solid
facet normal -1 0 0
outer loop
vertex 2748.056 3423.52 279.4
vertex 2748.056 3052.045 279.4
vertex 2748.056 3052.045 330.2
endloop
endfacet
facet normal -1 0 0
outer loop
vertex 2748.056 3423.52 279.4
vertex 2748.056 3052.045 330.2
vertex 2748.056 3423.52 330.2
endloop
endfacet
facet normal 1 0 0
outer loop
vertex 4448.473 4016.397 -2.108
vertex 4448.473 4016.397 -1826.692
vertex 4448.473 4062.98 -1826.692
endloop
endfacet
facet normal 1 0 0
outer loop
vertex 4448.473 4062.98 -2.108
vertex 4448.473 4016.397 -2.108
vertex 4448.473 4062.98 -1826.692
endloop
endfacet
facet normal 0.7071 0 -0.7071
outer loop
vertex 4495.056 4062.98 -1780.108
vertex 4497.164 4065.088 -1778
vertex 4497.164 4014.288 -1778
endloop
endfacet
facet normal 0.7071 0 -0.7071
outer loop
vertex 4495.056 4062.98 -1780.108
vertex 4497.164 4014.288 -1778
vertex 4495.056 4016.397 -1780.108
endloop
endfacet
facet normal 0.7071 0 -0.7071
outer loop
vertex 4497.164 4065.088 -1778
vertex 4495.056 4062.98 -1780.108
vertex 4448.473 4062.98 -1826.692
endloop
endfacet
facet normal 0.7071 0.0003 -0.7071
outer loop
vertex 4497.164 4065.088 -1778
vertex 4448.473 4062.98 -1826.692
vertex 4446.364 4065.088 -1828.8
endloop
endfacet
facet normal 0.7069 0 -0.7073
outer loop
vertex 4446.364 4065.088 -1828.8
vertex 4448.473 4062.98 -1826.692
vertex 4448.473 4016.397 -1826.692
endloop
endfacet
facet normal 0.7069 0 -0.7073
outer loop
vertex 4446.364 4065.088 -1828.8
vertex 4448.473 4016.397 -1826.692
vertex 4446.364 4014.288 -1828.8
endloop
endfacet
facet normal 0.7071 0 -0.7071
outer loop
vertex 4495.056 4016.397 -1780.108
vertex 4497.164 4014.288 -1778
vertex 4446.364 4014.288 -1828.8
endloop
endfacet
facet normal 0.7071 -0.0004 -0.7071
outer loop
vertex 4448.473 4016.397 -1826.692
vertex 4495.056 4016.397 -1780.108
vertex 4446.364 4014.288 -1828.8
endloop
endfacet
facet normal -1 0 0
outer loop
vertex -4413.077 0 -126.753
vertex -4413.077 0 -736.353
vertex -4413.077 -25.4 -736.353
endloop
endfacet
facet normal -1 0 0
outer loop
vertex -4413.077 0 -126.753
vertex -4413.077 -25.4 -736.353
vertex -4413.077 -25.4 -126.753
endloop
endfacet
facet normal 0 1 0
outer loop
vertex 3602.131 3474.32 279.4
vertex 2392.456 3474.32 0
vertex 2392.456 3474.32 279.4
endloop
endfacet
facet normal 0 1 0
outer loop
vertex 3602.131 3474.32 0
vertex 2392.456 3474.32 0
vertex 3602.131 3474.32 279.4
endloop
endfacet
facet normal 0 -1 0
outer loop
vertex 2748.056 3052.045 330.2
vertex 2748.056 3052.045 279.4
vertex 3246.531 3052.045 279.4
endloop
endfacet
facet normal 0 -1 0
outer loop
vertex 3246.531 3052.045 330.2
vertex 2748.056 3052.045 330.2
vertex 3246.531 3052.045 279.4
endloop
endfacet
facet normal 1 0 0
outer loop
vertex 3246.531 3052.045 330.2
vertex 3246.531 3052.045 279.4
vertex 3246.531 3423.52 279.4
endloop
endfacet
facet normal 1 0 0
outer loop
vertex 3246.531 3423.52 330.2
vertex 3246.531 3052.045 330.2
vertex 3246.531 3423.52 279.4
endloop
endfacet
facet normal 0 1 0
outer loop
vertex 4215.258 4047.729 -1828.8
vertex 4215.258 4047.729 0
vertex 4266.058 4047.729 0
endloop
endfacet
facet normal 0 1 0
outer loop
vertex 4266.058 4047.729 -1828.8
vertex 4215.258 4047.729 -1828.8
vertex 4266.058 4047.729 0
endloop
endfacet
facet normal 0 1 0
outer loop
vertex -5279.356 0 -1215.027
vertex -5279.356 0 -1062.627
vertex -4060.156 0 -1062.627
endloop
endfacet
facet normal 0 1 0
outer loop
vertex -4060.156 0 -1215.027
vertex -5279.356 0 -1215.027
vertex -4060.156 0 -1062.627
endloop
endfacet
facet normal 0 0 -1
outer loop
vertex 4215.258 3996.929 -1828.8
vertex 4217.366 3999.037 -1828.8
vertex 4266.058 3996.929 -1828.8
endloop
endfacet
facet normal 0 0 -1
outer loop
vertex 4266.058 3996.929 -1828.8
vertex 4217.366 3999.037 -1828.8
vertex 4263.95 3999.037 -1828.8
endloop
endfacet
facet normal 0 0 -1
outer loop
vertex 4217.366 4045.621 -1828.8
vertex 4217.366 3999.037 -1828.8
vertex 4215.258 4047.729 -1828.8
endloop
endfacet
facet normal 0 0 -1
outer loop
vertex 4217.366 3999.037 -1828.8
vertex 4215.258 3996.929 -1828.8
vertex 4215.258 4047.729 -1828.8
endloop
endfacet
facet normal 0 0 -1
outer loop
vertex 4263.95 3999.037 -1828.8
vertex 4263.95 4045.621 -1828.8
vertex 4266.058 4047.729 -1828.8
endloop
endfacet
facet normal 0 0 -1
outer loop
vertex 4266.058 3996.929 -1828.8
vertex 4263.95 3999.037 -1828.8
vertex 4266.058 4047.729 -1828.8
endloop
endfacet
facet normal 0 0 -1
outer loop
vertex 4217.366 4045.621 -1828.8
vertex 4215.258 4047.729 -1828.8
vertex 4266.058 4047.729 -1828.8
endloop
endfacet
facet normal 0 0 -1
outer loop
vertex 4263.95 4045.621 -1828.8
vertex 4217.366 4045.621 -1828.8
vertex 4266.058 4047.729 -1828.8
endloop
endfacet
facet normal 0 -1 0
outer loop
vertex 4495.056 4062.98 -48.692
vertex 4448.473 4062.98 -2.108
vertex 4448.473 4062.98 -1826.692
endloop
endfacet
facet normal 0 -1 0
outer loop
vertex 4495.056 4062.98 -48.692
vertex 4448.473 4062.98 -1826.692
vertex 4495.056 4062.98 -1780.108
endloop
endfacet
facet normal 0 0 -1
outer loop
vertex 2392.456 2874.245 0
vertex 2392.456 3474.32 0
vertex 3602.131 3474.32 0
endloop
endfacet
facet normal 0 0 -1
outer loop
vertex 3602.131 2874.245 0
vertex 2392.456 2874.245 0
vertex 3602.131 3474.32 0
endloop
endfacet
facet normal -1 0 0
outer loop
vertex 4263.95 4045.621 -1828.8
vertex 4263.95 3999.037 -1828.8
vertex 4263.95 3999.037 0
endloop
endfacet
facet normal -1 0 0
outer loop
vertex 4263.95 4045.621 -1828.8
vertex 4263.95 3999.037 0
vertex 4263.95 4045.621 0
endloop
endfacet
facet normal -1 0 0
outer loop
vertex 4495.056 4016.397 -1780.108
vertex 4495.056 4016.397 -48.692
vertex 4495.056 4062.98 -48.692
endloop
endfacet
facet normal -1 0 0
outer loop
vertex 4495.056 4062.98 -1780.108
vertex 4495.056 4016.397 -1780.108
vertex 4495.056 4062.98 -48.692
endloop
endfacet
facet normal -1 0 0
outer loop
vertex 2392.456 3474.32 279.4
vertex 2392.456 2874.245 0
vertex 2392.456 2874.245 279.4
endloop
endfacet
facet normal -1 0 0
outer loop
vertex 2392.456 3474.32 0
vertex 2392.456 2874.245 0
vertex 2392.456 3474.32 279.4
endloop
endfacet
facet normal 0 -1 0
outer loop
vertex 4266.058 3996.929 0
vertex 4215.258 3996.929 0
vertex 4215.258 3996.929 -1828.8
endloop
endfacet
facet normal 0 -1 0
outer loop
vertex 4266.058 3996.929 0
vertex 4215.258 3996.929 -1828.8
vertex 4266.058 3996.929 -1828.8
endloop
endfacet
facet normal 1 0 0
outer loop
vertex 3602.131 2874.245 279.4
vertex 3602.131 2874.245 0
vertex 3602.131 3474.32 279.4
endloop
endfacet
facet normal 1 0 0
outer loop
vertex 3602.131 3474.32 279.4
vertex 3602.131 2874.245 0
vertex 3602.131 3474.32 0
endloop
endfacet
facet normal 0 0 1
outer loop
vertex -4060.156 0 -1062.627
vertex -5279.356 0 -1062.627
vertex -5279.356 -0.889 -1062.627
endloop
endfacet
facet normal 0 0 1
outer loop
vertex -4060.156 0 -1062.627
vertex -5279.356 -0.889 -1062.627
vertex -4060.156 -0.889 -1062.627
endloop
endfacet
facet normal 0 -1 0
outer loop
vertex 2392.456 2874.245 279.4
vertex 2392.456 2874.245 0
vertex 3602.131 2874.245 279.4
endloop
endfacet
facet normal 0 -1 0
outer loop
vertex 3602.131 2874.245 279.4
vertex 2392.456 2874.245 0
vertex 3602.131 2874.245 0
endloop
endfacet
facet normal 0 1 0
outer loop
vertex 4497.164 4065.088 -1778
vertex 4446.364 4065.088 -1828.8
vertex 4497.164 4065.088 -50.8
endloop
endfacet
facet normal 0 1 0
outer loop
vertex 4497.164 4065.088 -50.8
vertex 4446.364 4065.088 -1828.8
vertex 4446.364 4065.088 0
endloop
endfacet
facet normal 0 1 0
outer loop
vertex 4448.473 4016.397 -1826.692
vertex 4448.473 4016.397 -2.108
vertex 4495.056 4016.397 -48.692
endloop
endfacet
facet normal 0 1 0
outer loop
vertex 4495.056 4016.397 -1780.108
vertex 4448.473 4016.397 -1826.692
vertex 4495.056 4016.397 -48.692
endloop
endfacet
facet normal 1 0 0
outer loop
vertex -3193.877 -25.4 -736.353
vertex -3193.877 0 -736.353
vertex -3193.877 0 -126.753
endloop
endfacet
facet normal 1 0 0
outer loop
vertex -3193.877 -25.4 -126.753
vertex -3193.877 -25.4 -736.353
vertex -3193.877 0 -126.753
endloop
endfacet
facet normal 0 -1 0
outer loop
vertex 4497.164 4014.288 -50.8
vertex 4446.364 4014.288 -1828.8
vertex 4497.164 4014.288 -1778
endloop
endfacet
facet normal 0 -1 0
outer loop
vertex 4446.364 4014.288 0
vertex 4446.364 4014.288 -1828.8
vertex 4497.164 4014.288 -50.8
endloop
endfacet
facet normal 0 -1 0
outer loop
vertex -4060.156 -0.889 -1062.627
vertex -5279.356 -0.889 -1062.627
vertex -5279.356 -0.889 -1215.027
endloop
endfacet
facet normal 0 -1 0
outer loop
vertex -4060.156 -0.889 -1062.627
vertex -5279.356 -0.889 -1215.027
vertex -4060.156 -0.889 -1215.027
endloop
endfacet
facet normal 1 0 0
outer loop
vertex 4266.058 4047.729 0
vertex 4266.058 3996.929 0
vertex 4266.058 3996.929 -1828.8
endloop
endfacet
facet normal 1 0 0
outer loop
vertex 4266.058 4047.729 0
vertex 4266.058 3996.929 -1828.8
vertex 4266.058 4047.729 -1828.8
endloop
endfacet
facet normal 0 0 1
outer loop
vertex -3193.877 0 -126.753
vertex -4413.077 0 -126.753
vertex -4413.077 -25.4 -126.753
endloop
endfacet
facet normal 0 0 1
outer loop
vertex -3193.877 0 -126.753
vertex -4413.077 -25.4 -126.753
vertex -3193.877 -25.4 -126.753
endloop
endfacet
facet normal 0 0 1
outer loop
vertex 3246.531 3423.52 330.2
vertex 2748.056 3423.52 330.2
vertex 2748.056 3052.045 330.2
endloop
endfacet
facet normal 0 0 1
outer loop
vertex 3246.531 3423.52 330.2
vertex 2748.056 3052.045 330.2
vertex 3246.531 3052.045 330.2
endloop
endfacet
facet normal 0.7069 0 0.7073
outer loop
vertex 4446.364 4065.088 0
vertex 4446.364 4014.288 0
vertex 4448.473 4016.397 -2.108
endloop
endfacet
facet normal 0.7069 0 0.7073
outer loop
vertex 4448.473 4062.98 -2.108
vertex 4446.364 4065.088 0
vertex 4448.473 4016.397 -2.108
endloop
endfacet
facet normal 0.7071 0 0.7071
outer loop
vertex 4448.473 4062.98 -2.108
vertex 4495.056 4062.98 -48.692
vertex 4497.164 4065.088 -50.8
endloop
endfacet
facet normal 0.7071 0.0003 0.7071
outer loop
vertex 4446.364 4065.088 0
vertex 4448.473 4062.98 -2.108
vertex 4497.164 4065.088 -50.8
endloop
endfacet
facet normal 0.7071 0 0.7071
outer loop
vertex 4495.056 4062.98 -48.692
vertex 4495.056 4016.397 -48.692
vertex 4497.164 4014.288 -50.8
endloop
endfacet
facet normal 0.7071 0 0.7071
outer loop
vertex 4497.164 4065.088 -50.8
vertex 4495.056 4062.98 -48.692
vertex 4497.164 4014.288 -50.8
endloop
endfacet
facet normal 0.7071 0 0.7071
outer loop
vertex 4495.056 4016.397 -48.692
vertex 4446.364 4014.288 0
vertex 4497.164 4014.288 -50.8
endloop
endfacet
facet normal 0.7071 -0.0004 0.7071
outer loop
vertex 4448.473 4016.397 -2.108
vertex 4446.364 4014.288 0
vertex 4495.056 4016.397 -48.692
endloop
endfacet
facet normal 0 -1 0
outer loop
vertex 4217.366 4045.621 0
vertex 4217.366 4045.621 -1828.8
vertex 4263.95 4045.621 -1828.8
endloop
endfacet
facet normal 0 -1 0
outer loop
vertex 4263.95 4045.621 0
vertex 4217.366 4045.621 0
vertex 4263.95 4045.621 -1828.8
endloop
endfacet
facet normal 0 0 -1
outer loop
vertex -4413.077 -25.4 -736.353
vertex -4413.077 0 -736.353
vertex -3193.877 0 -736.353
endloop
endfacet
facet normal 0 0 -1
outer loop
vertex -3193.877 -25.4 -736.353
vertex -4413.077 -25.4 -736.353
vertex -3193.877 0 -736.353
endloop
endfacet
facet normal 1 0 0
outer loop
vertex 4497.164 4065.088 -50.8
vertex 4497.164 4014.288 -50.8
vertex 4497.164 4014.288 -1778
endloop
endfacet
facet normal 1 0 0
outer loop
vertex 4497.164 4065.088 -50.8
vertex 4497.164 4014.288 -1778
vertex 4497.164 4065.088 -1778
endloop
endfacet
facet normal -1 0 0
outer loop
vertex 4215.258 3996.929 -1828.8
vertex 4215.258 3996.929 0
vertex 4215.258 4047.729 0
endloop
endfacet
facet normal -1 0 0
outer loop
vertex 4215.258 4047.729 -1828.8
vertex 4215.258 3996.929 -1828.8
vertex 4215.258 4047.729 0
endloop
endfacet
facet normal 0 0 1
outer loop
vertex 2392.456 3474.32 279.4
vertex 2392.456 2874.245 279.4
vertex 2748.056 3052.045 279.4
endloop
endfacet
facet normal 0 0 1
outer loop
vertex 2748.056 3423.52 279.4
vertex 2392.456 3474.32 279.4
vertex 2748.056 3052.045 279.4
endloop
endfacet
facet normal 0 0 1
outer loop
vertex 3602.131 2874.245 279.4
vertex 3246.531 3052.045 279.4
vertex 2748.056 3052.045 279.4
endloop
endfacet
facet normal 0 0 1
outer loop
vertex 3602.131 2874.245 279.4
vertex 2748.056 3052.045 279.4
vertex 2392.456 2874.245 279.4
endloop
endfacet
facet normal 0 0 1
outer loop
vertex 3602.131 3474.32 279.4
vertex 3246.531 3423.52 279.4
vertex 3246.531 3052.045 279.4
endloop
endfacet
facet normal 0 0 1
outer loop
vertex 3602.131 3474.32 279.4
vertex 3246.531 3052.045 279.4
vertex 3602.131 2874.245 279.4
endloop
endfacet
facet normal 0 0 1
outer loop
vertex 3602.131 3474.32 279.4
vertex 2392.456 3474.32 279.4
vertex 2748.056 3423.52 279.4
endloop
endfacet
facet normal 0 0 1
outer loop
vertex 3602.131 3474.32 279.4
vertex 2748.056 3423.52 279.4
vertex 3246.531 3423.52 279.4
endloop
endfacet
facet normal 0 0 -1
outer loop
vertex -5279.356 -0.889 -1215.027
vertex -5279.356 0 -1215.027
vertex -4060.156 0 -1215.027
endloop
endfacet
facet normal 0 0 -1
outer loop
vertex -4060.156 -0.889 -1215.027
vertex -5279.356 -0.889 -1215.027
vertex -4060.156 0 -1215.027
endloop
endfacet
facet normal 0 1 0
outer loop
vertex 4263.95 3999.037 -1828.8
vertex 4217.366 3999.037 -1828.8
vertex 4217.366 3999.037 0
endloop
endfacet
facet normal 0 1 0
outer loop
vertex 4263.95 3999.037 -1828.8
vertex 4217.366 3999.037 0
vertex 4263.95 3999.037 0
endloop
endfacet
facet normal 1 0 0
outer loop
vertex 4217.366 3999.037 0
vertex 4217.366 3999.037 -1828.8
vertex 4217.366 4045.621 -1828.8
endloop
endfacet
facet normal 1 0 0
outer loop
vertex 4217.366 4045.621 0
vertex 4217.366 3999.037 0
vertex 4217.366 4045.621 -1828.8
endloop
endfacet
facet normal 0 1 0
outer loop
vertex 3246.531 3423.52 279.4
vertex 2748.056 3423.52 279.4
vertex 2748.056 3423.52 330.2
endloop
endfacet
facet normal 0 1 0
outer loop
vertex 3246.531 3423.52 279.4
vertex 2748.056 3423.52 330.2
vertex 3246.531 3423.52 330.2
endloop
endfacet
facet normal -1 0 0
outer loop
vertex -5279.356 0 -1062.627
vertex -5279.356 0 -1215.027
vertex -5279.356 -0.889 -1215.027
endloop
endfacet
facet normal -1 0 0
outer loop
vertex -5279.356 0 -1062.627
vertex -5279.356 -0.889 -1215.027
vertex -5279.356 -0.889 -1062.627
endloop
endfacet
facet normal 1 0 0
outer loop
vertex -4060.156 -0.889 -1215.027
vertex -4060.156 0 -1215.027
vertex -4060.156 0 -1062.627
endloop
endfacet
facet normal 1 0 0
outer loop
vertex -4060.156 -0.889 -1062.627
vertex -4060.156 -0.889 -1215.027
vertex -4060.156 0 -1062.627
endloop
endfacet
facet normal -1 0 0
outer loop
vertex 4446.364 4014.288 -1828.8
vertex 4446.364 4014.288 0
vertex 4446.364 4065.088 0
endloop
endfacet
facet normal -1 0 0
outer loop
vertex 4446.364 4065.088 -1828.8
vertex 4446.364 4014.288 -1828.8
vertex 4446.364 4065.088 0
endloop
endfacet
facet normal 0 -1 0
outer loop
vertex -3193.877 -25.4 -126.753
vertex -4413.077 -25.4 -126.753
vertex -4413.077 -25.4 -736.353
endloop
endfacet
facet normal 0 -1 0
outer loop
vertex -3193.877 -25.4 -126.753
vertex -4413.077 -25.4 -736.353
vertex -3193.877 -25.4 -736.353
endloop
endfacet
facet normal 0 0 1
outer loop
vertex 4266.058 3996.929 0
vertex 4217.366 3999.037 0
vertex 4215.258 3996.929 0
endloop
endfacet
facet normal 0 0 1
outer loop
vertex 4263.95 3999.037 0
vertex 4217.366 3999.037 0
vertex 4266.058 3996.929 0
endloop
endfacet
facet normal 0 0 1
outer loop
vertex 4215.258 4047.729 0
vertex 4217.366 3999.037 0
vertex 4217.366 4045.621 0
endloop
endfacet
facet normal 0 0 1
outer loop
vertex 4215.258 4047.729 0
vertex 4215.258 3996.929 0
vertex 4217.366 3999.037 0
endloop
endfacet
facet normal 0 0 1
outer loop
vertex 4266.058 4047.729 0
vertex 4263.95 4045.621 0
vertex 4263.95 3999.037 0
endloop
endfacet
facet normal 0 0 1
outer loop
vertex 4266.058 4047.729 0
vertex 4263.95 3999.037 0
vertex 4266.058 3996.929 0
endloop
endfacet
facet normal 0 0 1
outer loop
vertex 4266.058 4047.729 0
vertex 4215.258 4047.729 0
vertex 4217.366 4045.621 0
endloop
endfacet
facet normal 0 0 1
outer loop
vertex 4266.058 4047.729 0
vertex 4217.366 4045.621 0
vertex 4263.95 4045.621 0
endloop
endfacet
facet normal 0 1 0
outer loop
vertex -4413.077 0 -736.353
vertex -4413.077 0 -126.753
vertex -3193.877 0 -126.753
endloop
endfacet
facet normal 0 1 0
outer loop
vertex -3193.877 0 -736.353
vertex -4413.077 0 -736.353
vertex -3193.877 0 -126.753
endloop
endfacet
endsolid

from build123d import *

# Parameters (mm, degrees)
F0_W      = 1209.675
F0_H      = 600.075
F1_DEPTH  = 279.4
F2_W      = 498.475
F2_H      = 371.475
F3_DEPTH  = 50.8
F4_W      = 50.8
F4_H      = 50.8
F4_W_2    = 46.5836
F4_H_2    = 46.5836
F5_DEPTH  = 1828.8
F6_W      = 50.8
F6_H      = 50.8
F6_W_2    = 46.5836
F6_H_2    = 46.5836
F7_DEPTH  = 1828.8
F9_DEPTH  = 50.801
F10_W     = 1219.2
F10_H     = 609.6
F11_DEPTH = 25.4
F12_W     = 1219.2
F12_H     = 152.4
F13_DEPTH = 0.889


with BuildPart() as f1:
    # F0 (on Top) → F1 (new body)
    with BuildSketch(Plane.XY):
        with Locations((2997.293917, 3174.282193)):
            Rectangle(F0_W, F0_H)
    extrude(amount=F1_DEPTH)

    # F2 (on face) → F3 (join)
    with BuildSketch(Plane.XY.offset(279.4)):
        with Locations((2997.293917, 3237.782193)):
            Rectangle(F2_W, F2_H)
    extrude(amount=F3_DEPTH)


with BuildPart() as f5:
    # F4 (on Top) → F5 (new body)
    with BuildSketch(Plane.XY):
        with Locations((4240.657888, 4022.32898)):
            Rectangle(F4_W, F4_H)
        with Locations((4240.657888, 4022.32898)):
            Rectangle(F4_W_2, F4_H_2, mode=Mode.SUBTRACT)
    extrude(amount=-F5_DEPTH)


with BuildPart() as f7:
    # F6 (on Top) → F7 (new body)
    with BuildSketch(Plane.XY):
        with Locations((4471.764326, 4039.688429)):
            Rectangle(F6_W, F6_H)
        with Locations((4471.764326, 4039.688429)):
            Rectangle(F6_W_2, F6_H_2, mode=Mode.SUBTRACT)
    extrude(amount=-F7_DEPTH)

    # F8 (on face) → F9 (cut, through all)
    with BuildSketch(Plane.XZ.offset(-4014.288429)):
        Polygon((4497.164326, 0), (4446.364326, 0), (4497.164326, -50.8), align=None)
        Polygon((4497.164326, -1778), (4446.364326, -1828.8), (4497.164326, -1828.8), align=None)
    extrude(amount=-F9_DEPTH, mode=Mode.SUBTRACT)


with BuildPart() as f11:
    # F10 (on Front) → F11 (new body)
    with BuildSketch(Plane.XZ):
        with Locations((-3803.47707, -431.553446)):
            Rectangle(F10_W, F10_H)
    extrude(amount=F11_DEPTH)


with BuildPart() as f13:
    # F12 (on Front) → F13 (new body)
    with BuildSketch(Plane.XZ):
        with Locations((-4669.756493, -1138.826966)):
            Rectangle(F12_W, F12_H)
    extrude(amount=F13_DEPTH)


solid = Compound([f1.part, f5.part, f7.part, f11.part, f13.part])
